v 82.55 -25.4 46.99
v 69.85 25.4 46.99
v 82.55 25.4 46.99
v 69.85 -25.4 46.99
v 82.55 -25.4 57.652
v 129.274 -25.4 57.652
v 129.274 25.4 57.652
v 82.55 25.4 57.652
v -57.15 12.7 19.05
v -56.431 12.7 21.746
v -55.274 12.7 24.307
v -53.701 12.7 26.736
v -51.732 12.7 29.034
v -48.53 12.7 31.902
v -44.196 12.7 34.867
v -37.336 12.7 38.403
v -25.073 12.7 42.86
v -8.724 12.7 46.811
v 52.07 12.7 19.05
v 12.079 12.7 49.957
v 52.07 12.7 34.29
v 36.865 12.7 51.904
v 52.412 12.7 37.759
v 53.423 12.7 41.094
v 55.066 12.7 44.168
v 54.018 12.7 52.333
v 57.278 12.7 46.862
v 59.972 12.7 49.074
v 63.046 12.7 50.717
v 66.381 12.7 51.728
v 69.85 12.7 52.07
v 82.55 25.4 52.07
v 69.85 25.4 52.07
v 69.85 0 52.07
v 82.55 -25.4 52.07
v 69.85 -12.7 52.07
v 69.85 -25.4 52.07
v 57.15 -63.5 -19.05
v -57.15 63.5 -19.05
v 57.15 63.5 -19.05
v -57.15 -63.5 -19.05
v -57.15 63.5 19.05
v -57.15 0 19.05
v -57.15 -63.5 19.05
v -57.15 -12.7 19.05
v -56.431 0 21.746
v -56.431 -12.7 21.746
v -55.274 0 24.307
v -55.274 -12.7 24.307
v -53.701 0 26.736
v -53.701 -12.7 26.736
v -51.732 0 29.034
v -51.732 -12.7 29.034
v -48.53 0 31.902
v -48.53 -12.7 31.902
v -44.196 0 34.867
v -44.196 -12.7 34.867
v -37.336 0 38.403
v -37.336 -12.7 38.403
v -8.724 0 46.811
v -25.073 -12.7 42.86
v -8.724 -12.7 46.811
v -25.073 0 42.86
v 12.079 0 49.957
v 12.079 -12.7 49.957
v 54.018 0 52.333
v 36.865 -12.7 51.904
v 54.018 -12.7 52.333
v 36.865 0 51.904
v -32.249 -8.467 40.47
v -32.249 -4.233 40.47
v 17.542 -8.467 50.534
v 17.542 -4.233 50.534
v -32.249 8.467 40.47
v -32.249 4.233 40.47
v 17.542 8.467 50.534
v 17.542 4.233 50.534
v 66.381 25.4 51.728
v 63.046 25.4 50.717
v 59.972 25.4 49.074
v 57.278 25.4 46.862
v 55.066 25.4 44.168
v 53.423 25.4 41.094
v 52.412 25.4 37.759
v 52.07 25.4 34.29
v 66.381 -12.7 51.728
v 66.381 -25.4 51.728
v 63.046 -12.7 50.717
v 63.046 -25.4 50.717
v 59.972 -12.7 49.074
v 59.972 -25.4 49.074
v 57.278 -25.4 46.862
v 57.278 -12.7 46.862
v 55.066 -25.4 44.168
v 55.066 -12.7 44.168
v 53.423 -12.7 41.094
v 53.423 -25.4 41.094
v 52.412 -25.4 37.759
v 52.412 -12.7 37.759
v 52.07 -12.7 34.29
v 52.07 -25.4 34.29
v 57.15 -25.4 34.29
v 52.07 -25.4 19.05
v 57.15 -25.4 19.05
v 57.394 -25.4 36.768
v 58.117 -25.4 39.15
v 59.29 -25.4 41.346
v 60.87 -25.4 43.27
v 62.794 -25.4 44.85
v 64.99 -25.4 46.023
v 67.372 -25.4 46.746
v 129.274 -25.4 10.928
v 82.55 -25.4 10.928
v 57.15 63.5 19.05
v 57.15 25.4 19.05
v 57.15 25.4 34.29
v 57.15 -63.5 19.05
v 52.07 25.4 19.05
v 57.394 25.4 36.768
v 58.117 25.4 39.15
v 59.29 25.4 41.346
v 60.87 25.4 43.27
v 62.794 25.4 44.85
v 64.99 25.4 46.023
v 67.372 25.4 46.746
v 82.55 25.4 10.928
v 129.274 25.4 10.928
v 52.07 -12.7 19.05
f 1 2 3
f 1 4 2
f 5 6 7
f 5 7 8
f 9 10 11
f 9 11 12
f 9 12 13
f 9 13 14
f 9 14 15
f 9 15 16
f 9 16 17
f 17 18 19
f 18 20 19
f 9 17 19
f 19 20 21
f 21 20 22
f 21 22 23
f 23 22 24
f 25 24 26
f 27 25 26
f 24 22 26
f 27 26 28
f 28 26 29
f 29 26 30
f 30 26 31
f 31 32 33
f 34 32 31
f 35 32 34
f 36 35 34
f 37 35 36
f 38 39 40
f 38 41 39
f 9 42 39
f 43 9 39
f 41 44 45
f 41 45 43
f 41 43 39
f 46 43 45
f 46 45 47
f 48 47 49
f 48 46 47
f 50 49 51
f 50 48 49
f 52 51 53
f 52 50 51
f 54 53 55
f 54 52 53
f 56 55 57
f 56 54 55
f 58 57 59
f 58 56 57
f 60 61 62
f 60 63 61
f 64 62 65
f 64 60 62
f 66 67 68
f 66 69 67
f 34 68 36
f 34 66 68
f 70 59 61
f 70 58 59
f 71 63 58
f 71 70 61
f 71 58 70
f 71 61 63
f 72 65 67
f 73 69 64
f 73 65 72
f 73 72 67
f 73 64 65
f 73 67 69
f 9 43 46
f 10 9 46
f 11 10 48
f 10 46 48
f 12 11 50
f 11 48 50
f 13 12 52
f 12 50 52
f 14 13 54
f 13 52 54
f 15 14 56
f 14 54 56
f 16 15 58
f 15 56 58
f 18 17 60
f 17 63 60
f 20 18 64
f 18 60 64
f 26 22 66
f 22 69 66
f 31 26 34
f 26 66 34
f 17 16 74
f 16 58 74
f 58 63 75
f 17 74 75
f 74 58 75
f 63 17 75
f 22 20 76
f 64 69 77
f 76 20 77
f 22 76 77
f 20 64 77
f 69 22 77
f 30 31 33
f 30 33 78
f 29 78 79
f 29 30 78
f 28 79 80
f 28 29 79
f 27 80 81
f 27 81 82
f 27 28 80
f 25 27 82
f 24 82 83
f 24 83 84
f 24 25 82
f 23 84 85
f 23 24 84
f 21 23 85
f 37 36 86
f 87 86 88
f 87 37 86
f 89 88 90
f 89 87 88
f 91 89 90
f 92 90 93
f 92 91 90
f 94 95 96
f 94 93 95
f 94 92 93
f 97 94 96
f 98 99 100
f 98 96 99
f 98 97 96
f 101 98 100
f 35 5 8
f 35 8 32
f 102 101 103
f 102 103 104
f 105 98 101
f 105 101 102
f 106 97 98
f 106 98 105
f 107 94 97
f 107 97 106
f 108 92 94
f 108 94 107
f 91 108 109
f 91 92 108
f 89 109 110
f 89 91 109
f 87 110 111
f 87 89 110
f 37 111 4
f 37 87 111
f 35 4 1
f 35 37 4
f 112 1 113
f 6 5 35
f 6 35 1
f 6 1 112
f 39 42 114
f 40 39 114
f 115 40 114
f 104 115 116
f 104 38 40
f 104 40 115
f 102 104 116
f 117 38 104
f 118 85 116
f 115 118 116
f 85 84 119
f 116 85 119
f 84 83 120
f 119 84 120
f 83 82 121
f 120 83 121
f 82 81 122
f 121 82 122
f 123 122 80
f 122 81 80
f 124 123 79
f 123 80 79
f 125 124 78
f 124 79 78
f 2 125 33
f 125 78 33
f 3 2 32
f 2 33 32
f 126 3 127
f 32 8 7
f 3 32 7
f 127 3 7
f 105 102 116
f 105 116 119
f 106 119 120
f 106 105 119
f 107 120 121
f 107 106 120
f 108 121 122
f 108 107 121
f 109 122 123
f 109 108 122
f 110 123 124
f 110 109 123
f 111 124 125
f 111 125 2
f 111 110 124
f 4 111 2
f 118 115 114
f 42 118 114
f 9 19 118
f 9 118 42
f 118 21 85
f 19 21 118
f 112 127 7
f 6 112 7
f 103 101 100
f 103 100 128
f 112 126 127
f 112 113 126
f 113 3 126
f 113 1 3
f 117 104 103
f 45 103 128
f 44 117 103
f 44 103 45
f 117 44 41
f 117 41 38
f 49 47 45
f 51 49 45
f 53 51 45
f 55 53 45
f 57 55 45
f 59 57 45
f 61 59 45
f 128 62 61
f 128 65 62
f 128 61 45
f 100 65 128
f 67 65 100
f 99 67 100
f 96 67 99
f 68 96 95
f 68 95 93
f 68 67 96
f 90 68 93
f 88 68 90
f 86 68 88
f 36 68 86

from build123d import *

# Parameters (mm, degrees)
F1_DEPTH = 63.5
F2_DEPTH = 12.7
F3_DEPTH = 25.4


with BuildPart() as f1:
    # F0 (on Front) → F1 (new body, symmetric)
    with BuildSketch(Plane.XZ):
        Polygon((57.15, -19.05), (57.15, 19.05), (52.07, 19.05), (-57.15, 19.05), (-57.15, -19.05), align=None)
    extrude(amount=F1_DEPTH, both=True)

    # F0 (on Front) → F2 (join, symmetric)
    with BuildSketch(Plane.XZ):
        with BuildLine():
            Line((-57.15, 19.05), (52.07, 19.05))
            Line((52.07, 19.05), (52.07, 34.29))
            ThreePointArc((52.07, 34.29), (57.277641, 46.862359), (69.85, 52.07))
            add(Edge.make_bspline(
                [(-57.15, 19.05), (-52.152008, 47.089871), (23.740247, 53.854882), (69.85, 52.07)],
                knots=[0, 0, 0, 0, 131.222408, 131.222408, 131.222408, 131.222408], degree=3))
        make_face()
    extrude(amount=F2_DEPTH, both=True)

    # F0 (on Front) → F3 (join, symmetric)
    with BuildSketch(Plane.XZ):
        Polygon((82.55, 52.07), (82.55, 46.99), (82.55, 10.928008), (129.273983, 10.928008), (129.273983, 57.651992), (82.55, 57.651992), align=None)
        with BuildLine():
            Line((52.07, 19.05), (57.15, 19.05))
            Line((57.15, 19.05), (57.15, 34.29))
            ThreePointArc((57.15, 34.29), (60.869744, 43.270256), (69.85, 46.99))
            Line((69.85, 46.99), (82.55, 46.99))
            Line((82.55, 46.99), (82.55, 52.07))
            Line((82.55, 52.07), (69.85, 52.07))
            ThreePointArc((69.85, 52.07), (57.277641, 46.862359), (52.07, 34.29))
            Line((52.07, 34.29), (52.07, 19.05))
        make_face()
    extrude(amount=F3_DEPTH, both=True)


solid = f1.part
